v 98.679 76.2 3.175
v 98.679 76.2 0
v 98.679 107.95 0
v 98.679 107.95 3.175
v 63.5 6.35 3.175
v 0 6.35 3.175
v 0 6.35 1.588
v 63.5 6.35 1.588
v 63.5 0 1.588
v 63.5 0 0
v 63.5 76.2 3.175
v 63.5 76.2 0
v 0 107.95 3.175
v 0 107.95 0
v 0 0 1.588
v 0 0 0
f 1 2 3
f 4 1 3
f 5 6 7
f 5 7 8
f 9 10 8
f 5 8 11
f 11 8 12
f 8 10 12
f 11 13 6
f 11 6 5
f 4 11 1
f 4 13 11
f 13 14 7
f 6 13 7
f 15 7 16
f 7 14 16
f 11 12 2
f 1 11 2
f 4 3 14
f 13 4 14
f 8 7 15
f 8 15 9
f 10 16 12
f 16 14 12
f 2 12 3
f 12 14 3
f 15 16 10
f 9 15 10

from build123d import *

# Parameters (mm, degrees)
BOSS_EXTRUDE1_DEPTH = 3.175
SKETCH2_W           = 63.5
SKETCH2_H           = 6.35
CUT_EXTRUDE1_DEPTH  = 1.5875


with BuildPart() as part:
    # Sketch1 → Boss-Extrude1 (new body)
    with BuildSketch(Plane.XY):
        Polygon((0, 0), (63.5, 0), (63.5, 76.2), (98.679, 76.2), (98.679, 107.95), (63.5, 107.95), (0, 107.95), align=None)
    extrude(amount=BOSS_EXTRUDE1_DEPTH)

    # Sketch2 → Cut-Extrude1 (cut)
    with BuildSketch(Plane.XY.offset(3.175)):
        with Locations((31.75, 3.175)):
            Rectangle(SKETCH2_W, SKETCH2_H)
    extrude(amount=-CUT_EXTRUDE1_DEPTH, mode=Mode.SUBTRACT)


solid = part.part
